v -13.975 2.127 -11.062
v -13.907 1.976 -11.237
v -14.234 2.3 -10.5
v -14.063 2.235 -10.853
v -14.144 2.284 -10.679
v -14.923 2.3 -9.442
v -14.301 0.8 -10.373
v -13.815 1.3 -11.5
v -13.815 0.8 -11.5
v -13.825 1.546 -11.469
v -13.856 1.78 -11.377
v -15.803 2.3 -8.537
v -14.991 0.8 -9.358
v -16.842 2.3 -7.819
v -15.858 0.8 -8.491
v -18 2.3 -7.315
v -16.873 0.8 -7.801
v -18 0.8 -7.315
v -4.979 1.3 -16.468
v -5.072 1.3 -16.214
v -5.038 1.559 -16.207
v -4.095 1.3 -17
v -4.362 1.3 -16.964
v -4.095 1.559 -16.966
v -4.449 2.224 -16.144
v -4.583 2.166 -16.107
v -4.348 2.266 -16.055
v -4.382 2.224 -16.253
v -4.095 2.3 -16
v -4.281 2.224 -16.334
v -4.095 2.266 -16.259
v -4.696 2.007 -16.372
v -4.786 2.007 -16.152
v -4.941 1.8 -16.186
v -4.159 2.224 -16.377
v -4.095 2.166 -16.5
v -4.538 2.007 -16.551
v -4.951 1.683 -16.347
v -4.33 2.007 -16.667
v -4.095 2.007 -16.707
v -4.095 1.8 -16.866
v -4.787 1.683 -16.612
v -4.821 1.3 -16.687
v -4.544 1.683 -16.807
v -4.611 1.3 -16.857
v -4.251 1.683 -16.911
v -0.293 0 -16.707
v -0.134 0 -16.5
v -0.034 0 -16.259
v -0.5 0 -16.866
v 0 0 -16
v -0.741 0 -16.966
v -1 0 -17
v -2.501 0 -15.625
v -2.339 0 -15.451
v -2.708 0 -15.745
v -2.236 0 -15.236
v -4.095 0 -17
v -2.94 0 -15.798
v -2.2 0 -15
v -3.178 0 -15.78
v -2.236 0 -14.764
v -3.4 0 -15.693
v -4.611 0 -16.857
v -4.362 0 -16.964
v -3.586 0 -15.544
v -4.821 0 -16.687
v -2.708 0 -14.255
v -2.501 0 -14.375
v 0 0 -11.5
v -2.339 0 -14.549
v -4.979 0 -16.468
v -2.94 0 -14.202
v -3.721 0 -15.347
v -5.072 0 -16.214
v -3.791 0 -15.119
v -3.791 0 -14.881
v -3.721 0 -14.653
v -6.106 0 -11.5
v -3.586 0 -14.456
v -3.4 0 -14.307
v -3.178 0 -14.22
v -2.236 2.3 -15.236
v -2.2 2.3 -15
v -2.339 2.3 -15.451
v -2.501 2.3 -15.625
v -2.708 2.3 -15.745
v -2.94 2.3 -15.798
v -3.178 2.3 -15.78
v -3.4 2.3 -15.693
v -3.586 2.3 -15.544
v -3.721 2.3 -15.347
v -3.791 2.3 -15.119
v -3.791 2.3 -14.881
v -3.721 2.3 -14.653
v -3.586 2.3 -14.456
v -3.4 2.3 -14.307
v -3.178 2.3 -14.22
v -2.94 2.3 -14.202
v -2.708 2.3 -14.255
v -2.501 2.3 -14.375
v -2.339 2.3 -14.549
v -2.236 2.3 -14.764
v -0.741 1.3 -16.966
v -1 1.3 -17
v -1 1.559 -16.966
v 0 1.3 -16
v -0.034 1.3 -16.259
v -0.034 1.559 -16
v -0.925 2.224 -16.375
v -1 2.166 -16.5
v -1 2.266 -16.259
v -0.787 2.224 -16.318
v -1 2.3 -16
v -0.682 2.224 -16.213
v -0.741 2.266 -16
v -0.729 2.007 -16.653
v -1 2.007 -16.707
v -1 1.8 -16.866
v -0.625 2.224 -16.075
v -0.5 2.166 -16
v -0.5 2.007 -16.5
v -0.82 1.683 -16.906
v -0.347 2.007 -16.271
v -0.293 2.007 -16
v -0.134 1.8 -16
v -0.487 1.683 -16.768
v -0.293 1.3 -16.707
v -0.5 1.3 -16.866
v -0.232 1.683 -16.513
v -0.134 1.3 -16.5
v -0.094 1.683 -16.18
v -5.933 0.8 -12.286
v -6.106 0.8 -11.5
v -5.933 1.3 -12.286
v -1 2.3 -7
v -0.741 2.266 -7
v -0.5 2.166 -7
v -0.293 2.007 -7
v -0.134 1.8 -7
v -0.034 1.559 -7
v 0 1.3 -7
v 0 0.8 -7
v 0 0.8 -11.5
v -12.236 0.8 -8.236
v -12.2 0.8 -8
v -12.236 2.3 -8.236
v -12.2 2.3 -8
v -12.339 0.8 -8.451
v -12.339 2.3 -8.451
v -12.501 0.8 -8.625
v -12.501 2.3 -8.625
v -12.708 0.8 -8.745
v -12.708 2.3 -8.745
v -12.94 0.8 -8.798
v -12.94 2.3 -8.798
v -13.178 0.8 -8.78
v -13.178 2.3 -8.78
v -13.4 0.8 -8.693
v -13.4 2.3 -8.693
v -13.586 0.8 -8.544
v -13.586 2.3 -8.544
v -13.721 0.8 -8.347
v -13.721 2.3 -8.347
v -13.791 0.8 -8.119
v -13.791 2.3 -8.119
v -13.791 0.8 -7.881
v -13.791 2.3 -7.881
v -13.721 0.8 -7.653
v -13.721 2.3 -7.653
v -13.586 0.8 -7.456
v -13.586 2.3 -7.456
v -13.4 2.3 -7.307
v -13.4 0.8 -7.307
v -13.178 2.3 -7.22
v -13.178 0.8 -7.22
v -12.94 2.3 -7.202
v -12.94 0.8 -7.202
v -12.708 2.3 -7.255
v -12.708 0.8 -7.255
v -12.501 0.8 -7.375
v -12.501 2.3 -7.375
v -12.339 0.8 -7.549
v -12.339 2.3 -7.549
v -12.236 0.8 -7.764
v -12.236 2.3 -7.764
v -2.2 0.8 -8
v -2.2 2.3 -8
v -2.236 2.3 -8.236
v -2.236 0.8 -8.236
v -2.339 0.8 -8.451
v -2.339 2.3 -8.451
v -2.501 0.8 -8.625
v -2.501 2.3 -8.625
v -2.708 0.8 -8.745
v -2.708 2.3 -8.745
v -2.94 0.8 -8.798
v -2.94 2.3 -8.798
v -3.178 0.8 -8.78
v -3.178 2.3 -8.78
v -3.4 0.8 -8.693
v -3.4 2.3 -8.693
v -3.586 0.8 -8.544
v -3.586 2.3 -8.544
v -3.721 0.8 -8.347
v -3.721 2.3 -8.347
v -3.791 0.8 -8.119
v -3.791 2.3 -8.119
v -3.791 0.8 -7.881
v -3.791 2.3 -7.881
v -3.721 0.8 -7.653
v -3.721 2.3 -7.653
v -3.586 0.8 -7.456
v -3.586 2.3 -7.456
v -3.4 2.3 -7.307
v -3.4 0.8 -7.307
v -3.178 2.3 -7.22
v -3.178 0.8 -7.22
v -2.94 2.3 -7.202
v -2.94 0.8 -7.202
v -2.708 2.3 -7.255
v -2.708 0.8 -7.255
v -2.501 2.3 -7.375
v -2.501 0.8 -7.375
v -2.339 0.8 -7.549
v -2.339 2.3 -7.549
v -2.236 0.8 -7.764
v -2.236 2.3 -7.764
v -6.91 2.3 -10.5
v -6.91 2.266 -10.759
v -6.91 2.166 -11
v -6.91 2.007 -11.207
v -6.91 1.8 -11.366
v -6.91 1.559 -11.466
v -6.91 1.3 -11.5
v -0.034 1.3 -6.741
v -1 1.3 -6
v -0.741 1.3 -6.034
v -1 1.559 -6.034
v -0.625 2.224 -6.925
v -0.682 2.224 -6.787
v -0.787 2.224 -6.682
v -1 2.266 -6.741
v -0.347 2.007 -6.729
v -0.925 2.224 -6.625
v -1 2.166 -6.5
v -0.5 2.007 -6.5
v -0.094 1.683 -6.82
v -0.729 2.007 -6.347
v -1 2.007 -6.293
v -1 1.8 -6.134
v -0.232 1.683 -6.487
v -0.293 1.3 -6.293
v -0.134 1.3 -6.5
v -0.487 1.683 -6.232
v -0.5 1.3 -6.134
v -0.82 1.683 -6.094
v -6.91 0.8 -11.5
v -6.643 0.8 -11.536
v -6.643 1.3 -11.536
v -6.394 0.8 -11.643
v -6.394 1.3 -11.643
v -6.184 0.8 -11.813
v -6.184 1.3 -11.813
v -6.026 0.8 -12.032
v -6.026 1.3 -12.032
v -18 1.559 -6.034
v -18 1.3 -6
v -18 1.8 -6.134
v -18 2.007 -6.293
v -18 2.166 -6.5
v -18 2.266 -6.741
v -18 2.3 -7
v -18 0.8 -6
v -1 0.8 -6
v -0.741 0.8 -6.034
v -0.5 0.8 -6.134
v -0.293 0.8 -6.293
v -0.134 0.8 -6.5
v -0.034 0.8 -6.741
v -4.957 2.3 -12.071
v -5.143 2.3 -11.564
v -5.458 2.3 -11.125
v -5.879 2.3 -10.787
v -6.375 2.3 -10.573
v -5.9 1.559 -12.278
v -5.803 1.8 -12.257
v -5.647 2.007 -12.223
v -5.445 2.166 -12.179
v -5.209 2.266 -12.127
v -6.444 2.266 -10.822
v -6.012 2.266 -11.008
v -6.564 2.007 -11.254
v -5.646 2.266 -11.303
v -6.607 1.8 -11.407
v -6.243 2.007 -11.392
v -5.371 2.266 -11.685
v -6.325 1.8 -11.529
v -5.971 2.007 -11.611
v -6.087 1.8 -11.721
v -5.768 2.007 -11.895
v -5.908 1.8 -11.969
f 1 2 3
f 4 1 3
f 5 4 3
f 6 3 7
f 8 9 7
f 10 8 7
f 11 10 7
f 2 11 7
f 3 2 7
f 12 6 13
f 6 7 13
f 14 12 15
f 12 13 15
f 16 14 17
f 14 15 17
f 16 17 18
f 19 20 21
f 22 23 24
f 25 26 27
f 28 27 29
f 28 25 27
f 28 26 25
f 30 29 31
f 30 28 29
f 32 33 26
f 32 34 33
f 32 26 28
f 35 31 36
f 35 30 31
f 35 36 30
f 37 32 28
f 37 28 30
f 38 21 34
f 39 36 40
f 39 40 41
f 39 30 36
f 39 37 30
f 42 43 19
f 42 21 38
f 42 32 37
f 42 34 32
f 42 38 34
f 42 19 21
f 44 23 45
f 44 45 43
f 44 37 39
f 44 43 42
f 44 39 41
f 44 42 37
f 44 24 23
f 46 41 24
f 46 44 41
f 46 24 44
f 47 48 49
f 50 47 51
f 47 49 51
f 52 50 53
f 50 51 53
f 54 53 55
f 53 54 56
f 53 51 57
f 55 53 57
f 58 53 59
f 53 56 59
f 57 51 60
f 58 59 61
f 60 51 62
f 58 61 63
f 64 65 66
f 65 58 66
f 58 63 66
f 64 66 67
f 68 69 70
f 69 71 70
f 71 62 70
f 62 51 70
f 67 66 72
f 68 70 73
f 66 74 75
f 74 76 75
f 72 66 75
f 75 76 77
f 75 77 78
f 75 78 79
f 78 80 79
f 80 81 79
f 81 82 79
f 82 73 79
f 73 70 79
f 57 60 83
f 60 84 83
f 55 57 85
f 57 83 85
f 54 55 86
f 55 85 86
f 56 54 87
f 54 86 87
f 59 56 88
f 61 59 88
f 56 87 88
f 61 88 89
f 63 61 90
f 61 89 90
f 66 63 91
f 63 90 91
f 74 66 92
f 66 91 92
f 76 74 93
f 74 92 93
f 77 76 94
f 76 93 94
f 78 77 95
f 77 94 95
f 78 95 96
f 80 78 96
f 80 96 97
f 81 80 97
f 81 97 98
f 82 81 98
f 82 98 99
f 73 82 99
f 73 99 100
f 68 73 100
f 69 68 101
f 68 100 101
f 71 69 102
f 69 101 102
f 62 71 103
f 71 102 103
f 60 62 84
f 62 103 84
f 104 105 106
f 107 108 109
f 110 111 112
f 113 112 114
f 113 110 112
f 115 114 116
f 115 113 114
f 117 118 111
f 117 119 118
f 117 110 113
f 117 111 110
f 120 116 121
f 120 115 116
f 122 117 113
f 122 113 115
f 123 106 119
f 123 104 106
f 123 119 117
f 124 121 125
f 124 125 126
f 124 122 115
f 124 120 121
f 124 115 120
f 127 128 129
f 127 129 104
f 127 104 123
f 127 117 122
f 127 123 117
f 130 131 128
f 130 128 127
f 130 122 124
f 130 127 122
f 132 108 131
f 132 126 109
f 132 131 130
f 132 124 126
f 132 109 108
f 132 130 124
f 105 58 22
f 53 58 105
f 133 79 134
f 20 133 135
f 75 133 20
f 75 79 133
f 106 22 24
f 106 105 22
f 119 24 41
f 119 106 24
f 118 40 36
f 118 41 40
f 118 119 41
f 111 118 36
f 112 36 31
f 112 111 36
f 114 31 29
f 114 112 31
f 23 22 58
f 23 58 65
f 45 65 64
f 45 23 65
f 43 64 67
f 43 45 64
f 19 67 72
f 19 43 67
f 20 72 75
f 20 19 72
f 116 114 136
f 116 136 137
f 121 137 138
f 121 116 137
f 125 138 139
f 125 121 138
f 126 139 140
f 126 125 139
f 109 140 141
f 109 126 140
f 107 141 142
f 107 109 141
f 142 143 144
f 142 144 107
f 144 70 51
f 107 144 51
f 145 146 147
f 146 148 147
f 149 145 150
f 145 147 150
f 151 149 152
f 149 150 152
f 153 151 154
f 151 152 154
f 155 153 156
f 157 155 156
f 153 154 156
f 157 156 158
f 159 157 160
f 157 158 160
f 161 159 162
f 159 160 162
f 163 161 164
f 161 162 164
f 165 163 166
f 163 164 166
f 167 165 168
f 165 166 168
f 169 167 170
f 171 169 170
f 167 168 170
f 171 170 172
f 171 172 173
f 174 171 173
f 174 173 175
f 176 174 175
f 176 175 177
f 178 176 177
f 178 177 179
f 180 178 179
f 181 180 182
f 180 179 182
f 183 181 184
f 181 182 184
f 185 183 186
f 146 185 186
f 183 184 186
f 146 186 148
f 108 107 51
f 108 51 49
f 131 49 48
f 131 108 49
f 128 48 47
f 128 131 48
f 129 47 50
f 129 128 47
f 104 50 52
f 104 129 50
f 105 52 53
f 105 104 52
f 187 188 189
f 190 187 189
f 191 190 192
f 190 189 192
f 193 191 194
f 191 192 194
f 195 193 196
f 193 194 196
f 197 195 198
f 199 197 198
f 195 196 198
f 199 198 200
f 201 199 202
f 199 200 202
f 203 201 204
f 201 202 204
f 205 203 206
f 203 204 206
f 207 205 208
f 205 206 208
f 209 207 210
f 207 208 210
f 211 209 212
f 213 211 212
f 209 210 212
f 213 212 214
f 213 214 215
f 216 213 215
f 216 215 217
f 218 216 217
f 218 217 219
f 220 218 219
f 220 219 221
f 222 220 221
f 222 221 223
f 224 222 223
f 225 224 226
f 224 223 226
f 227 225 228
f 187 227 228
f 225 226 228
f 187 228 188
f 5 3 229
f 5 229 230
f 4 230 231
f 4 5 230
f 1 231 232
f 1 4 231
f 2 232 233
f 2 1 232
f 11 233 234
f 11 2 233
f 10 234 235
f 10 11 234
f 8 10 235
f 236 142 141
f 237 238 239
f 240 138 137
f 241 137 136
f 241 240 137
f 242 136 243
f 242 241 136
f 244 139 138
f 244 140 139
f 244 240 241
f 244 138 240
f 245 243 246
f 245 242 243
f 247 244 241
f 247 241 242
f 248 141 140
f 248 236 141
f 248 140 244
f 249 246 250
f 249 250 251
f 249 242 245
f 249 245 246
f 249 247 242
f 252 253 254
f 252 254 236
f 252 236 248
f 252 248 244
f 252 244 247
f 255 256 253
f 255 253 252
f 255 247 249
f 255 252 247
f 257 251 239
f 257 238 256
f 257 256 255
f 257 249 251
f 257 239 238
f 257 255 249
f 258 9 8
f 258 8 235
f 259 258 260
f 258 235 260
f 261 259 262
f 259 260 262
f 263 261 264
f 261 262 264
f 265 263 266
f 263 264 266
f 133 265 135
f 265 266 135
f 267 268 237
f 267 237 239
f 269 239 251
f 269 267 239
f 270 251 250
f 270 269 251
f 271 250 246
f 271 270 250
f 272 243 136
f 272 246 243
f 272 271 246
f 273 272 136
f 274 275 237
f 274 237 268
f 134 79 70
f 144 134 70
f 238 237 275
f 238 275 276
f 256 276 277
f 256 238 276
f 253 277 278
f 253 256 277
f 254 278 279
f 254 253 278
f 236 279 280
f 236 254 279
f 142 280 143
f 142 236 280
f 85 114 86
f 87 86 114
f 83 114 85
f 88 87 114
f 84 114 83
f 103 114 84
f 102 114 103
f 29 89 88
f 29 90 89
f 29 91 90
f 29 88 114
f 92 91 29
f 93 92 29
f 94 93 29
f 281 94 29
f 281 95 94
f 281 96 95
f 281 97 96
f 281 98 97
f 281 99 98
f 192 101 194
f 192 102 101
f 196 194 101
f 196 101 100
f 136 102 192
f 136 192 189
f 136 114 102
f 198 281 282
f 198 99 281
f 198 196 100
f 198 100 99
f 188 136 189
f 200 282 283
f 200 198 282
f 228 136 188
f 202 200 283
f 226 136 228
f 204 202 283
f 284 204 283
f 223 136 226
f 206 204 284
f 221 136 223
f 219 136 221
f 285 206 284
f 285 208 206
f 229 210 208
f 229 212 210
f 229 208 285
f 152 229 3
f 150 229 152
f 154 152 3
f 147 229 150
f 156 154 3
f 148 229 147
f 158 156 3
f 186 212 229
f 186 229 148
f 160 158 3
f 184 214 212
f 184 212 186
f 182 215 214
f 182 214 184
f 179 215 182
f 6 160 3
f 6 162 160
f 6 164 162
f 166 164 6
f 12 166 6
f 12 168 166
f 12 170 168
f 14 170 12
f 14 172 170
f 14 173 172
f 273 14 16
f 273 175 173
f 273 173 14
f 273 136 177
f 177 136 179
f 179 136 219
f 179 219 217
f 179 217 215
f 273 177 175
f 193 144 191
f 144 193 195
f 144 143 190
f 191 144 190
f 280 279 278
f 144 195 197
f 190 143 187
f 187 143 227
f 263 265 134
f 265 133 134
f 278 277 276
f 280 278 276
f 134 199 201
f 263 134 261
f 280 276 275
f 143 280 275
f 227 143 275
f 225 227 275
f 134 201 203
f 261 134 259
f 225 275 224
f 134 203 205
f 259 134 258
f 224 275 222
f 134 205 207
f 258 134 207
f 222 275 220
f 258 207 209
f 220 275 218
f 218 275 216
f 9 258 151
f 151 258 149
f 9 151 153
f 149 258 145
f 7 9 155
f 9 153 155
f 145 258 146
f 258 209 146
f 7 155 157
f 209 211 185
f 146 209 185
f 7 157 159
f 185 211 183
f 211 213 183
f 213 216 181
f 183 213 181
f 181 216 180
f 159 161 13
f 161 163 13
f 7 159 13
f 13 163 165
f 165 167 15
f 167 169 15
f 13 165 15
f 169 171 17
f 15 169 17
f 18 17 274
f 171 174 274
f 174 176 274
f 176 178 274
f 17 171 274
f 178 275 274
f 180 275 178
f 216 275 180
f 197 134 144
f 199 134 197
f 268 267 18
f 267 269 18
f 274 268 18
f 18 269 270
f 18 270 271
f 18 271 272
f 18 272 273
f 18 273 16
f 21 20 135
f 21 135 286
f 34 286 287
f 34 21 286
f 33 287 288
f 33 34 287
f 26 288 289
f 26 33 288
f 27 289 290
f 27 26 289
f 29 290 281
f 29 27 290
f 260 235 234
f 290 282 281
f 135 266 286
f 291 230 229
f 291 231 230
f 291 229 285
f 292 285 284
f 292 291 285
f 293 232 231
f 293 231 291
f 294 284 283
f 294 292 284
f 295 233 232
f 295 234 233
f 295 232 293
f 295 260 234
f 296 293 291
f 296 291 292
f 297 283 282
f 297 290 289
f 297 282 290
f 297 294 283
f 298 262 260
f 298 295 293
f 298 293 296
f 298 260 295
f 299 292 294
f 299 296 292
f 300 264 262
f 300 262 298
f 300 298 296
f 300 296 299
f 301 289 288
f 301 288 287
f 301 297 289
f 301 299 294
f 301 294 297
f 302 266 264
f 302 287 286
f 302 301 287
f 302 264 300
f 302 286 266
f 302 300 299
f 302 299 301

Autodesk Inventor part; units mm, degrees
ref_plane "YZ Plane" through (0, 0, 0) normal (1, 0, 0) x (0, 1, 0)
ref_plane "XZ Plane" through (0, 0, 0) normal (0, 1, 0) x (-1, 0, 0)
ref_plane "XY Plane" through (0, 0, 0) normal (0, 0, 1) x (1, 0, 0)
sketch "スケッチ1" plane through (0, 0, 0) normal (0, 1, 0) x (-1, 0, 0)
  line L0 (20, 0) -> (0, 0)
  line L1 (0, 0) -> (0, -27)
  line L2 (0, -27) -> (20, -27)
  line L3 (20, -27) -> (20, 0)
  circle A0 centre (20, -13.5) radius 13.5
  circle A1 centre (20, -13.5) radius 14
  circle A2 centre (20, -13.5) radius 2
  line L4 (20, -11.5) -> (-0.0059, -11.5)
  line L5 (0, -27) -> (20, -27)
  line L6 (20, -27) -> (20, -17)
  line L7 (20, -17) -> (0, -17)
  line L8 (0, -17) -> (0, -27)
  line L9 (20, -11.5) -> (0, -11.5)
  line L10 (0, -11.5) -> (0, -6)
  line L11 (0, -6) -> (20, -6)
  line L12 (20, -6) -> (20, -11.5)
  circle A3 centre (20, -13.5) radius 6.5
  line L13 (20, -10.5) -> (-0.0015, -10.5)
  line L14 (6.3252, -10.5) -> (2.7054, -27)
  point P0 (16.2919, 0)
  point P1 (16.2919, -27)
  point P2 (0, -11.5)
  point P3 (6.1436, -11.5)
  point P4 (0, -17)
  point P5 (6.4446, -17)
  point P6 (8.1784, -6)
  point P7 (13.8153, -11.5)
  point P8 (20, -7)
  point P9 (14.5228, -17)
  point P10 (20, -20)
  point P11 (6.1058, -11.5)
  point P12 (4.8992, -17)
  dimension "d1" = 28
  dimension "d2" = 4
  dimension "d0" = 27
  dimension "d7" = 20
  dimension "d8" = 10
  dimension "d9" = 5.5
  dimension "d21" = 13
  dimension "d22" = 1
extrude "押し出し1" add sketch "スケッチ1" along normal blind 2.3 contours L3 A3 L13 A0 L11 | A0 L13 A1 L11 | A1 L13 L1 L11 | L13 A3 L4 A0 | A0 L4 A1 L13 | L14 L4 L1 L13 | A1 L4 L14 | L14 L7 L1 L4
extrude "押し出し2" cut sketch "スケッチ1" along normal blind 0.8 contours A1 L11 L1 L0 | L3 A3 L13 A0 L11 | A0 L13 A1 L11 | A1 L13 L1 L11 | L13 A3 L4 A0 | A0 L4 A1 L13 | L14 L4 L1 L13 | A1 L4 L14
sketch "スケッチ2" plane through (0, 2.3, 0) normal (0, 1, 0) x (1, 0, 0)
  circle A0 centre (-3, 15) radius 0.8
  line L0 (-20, 6) -> (0, 6) projected
  line L1 (0, 0) -> (0, 17) projected
  circle A1 centre (-3, 8) radius 0.8
  line L2 (0, 17) -> (-4.8992, 17) projected
  circle A2 centre (-13, 8) radius 0.8
  circle A3 centre (-13, 8) radius 0.8 projected
  circle A4 centre (-3, 8) radius 0.8 projected
  line L3 (-18, 0) -> (-18, 7.3153) projected
  line L4 (-18, 0) -> (0.4606, 0) projected
  line L5 (0.4606, 0.5589) -> (0.4606, 0) projected
  arc A5 (0.4606, 5.4411) -> (0.4606, 0.5589) centre (1, 3) ccw projected
  line L6 (0.4606, 10.5) -> (0.4606, 5.4411) projected
  line L7 (0.4606, 10.5) -> (-14.2337, 10.5) projected
  arc A6 (-18, 7.3153) -> (-14.2337, 10.5) centre (-20, 13.5) ccw projected
  arc A7 (-20, 7) -> (-13.8153, 11.5) centre (-20, 13.5) ccw projected
  line L8 (-20, 7) -> (-20, 6) projected
  line L9 (-20, 6) -> (0, 6) projected
  line L10 (0, 6) -> (0, 17) projected
  line L11 (0, 17) -> (-4.8992, 17) projected
  line L12 (-4.8992, 17) -> (-6.1058, 11.5) projected
  line L13 (-6.1058, 11.5) -> (-13.8153, 11.5) projected
  point P0 (-8.1784, 6)
  point P1 (-6.4446, 17)
  point P2 (-5.3497, 17)
  point P3 (0, 27)
  point P4 (-14.5228, 17)
  point P5 (-20, 17)
  point P6 (-18, 6)
  dimension "d11" = 1.6
  dimension "d14" = 1.6
  dimension "d15" = 2
  dimension "d16" = 3
  dimension "d17" = 2
  dimension "d23" = 1.6
  dimension "d24" = 10
extrude "押し出し3" cut sketch "スケッチ2" against normal through all contours A0 | L8 A7 L3 L0 | A1 | A2
fillet "フィレット1" radius 1 9 edges at (0, 1.55, -6) (0, 1.15, -17) (-9, 2.3, -6) (0, 2.3, -11.5) (-2.4496, 2.3, -17) (-9.9606, 2.3, -11.5) (-5.5025, 2.3, -14.25) (-4.8992, 1.15, -17) (-6.1058, 1.55, -11.5)
properties part number "leg_springjoint_cover_under_left"
